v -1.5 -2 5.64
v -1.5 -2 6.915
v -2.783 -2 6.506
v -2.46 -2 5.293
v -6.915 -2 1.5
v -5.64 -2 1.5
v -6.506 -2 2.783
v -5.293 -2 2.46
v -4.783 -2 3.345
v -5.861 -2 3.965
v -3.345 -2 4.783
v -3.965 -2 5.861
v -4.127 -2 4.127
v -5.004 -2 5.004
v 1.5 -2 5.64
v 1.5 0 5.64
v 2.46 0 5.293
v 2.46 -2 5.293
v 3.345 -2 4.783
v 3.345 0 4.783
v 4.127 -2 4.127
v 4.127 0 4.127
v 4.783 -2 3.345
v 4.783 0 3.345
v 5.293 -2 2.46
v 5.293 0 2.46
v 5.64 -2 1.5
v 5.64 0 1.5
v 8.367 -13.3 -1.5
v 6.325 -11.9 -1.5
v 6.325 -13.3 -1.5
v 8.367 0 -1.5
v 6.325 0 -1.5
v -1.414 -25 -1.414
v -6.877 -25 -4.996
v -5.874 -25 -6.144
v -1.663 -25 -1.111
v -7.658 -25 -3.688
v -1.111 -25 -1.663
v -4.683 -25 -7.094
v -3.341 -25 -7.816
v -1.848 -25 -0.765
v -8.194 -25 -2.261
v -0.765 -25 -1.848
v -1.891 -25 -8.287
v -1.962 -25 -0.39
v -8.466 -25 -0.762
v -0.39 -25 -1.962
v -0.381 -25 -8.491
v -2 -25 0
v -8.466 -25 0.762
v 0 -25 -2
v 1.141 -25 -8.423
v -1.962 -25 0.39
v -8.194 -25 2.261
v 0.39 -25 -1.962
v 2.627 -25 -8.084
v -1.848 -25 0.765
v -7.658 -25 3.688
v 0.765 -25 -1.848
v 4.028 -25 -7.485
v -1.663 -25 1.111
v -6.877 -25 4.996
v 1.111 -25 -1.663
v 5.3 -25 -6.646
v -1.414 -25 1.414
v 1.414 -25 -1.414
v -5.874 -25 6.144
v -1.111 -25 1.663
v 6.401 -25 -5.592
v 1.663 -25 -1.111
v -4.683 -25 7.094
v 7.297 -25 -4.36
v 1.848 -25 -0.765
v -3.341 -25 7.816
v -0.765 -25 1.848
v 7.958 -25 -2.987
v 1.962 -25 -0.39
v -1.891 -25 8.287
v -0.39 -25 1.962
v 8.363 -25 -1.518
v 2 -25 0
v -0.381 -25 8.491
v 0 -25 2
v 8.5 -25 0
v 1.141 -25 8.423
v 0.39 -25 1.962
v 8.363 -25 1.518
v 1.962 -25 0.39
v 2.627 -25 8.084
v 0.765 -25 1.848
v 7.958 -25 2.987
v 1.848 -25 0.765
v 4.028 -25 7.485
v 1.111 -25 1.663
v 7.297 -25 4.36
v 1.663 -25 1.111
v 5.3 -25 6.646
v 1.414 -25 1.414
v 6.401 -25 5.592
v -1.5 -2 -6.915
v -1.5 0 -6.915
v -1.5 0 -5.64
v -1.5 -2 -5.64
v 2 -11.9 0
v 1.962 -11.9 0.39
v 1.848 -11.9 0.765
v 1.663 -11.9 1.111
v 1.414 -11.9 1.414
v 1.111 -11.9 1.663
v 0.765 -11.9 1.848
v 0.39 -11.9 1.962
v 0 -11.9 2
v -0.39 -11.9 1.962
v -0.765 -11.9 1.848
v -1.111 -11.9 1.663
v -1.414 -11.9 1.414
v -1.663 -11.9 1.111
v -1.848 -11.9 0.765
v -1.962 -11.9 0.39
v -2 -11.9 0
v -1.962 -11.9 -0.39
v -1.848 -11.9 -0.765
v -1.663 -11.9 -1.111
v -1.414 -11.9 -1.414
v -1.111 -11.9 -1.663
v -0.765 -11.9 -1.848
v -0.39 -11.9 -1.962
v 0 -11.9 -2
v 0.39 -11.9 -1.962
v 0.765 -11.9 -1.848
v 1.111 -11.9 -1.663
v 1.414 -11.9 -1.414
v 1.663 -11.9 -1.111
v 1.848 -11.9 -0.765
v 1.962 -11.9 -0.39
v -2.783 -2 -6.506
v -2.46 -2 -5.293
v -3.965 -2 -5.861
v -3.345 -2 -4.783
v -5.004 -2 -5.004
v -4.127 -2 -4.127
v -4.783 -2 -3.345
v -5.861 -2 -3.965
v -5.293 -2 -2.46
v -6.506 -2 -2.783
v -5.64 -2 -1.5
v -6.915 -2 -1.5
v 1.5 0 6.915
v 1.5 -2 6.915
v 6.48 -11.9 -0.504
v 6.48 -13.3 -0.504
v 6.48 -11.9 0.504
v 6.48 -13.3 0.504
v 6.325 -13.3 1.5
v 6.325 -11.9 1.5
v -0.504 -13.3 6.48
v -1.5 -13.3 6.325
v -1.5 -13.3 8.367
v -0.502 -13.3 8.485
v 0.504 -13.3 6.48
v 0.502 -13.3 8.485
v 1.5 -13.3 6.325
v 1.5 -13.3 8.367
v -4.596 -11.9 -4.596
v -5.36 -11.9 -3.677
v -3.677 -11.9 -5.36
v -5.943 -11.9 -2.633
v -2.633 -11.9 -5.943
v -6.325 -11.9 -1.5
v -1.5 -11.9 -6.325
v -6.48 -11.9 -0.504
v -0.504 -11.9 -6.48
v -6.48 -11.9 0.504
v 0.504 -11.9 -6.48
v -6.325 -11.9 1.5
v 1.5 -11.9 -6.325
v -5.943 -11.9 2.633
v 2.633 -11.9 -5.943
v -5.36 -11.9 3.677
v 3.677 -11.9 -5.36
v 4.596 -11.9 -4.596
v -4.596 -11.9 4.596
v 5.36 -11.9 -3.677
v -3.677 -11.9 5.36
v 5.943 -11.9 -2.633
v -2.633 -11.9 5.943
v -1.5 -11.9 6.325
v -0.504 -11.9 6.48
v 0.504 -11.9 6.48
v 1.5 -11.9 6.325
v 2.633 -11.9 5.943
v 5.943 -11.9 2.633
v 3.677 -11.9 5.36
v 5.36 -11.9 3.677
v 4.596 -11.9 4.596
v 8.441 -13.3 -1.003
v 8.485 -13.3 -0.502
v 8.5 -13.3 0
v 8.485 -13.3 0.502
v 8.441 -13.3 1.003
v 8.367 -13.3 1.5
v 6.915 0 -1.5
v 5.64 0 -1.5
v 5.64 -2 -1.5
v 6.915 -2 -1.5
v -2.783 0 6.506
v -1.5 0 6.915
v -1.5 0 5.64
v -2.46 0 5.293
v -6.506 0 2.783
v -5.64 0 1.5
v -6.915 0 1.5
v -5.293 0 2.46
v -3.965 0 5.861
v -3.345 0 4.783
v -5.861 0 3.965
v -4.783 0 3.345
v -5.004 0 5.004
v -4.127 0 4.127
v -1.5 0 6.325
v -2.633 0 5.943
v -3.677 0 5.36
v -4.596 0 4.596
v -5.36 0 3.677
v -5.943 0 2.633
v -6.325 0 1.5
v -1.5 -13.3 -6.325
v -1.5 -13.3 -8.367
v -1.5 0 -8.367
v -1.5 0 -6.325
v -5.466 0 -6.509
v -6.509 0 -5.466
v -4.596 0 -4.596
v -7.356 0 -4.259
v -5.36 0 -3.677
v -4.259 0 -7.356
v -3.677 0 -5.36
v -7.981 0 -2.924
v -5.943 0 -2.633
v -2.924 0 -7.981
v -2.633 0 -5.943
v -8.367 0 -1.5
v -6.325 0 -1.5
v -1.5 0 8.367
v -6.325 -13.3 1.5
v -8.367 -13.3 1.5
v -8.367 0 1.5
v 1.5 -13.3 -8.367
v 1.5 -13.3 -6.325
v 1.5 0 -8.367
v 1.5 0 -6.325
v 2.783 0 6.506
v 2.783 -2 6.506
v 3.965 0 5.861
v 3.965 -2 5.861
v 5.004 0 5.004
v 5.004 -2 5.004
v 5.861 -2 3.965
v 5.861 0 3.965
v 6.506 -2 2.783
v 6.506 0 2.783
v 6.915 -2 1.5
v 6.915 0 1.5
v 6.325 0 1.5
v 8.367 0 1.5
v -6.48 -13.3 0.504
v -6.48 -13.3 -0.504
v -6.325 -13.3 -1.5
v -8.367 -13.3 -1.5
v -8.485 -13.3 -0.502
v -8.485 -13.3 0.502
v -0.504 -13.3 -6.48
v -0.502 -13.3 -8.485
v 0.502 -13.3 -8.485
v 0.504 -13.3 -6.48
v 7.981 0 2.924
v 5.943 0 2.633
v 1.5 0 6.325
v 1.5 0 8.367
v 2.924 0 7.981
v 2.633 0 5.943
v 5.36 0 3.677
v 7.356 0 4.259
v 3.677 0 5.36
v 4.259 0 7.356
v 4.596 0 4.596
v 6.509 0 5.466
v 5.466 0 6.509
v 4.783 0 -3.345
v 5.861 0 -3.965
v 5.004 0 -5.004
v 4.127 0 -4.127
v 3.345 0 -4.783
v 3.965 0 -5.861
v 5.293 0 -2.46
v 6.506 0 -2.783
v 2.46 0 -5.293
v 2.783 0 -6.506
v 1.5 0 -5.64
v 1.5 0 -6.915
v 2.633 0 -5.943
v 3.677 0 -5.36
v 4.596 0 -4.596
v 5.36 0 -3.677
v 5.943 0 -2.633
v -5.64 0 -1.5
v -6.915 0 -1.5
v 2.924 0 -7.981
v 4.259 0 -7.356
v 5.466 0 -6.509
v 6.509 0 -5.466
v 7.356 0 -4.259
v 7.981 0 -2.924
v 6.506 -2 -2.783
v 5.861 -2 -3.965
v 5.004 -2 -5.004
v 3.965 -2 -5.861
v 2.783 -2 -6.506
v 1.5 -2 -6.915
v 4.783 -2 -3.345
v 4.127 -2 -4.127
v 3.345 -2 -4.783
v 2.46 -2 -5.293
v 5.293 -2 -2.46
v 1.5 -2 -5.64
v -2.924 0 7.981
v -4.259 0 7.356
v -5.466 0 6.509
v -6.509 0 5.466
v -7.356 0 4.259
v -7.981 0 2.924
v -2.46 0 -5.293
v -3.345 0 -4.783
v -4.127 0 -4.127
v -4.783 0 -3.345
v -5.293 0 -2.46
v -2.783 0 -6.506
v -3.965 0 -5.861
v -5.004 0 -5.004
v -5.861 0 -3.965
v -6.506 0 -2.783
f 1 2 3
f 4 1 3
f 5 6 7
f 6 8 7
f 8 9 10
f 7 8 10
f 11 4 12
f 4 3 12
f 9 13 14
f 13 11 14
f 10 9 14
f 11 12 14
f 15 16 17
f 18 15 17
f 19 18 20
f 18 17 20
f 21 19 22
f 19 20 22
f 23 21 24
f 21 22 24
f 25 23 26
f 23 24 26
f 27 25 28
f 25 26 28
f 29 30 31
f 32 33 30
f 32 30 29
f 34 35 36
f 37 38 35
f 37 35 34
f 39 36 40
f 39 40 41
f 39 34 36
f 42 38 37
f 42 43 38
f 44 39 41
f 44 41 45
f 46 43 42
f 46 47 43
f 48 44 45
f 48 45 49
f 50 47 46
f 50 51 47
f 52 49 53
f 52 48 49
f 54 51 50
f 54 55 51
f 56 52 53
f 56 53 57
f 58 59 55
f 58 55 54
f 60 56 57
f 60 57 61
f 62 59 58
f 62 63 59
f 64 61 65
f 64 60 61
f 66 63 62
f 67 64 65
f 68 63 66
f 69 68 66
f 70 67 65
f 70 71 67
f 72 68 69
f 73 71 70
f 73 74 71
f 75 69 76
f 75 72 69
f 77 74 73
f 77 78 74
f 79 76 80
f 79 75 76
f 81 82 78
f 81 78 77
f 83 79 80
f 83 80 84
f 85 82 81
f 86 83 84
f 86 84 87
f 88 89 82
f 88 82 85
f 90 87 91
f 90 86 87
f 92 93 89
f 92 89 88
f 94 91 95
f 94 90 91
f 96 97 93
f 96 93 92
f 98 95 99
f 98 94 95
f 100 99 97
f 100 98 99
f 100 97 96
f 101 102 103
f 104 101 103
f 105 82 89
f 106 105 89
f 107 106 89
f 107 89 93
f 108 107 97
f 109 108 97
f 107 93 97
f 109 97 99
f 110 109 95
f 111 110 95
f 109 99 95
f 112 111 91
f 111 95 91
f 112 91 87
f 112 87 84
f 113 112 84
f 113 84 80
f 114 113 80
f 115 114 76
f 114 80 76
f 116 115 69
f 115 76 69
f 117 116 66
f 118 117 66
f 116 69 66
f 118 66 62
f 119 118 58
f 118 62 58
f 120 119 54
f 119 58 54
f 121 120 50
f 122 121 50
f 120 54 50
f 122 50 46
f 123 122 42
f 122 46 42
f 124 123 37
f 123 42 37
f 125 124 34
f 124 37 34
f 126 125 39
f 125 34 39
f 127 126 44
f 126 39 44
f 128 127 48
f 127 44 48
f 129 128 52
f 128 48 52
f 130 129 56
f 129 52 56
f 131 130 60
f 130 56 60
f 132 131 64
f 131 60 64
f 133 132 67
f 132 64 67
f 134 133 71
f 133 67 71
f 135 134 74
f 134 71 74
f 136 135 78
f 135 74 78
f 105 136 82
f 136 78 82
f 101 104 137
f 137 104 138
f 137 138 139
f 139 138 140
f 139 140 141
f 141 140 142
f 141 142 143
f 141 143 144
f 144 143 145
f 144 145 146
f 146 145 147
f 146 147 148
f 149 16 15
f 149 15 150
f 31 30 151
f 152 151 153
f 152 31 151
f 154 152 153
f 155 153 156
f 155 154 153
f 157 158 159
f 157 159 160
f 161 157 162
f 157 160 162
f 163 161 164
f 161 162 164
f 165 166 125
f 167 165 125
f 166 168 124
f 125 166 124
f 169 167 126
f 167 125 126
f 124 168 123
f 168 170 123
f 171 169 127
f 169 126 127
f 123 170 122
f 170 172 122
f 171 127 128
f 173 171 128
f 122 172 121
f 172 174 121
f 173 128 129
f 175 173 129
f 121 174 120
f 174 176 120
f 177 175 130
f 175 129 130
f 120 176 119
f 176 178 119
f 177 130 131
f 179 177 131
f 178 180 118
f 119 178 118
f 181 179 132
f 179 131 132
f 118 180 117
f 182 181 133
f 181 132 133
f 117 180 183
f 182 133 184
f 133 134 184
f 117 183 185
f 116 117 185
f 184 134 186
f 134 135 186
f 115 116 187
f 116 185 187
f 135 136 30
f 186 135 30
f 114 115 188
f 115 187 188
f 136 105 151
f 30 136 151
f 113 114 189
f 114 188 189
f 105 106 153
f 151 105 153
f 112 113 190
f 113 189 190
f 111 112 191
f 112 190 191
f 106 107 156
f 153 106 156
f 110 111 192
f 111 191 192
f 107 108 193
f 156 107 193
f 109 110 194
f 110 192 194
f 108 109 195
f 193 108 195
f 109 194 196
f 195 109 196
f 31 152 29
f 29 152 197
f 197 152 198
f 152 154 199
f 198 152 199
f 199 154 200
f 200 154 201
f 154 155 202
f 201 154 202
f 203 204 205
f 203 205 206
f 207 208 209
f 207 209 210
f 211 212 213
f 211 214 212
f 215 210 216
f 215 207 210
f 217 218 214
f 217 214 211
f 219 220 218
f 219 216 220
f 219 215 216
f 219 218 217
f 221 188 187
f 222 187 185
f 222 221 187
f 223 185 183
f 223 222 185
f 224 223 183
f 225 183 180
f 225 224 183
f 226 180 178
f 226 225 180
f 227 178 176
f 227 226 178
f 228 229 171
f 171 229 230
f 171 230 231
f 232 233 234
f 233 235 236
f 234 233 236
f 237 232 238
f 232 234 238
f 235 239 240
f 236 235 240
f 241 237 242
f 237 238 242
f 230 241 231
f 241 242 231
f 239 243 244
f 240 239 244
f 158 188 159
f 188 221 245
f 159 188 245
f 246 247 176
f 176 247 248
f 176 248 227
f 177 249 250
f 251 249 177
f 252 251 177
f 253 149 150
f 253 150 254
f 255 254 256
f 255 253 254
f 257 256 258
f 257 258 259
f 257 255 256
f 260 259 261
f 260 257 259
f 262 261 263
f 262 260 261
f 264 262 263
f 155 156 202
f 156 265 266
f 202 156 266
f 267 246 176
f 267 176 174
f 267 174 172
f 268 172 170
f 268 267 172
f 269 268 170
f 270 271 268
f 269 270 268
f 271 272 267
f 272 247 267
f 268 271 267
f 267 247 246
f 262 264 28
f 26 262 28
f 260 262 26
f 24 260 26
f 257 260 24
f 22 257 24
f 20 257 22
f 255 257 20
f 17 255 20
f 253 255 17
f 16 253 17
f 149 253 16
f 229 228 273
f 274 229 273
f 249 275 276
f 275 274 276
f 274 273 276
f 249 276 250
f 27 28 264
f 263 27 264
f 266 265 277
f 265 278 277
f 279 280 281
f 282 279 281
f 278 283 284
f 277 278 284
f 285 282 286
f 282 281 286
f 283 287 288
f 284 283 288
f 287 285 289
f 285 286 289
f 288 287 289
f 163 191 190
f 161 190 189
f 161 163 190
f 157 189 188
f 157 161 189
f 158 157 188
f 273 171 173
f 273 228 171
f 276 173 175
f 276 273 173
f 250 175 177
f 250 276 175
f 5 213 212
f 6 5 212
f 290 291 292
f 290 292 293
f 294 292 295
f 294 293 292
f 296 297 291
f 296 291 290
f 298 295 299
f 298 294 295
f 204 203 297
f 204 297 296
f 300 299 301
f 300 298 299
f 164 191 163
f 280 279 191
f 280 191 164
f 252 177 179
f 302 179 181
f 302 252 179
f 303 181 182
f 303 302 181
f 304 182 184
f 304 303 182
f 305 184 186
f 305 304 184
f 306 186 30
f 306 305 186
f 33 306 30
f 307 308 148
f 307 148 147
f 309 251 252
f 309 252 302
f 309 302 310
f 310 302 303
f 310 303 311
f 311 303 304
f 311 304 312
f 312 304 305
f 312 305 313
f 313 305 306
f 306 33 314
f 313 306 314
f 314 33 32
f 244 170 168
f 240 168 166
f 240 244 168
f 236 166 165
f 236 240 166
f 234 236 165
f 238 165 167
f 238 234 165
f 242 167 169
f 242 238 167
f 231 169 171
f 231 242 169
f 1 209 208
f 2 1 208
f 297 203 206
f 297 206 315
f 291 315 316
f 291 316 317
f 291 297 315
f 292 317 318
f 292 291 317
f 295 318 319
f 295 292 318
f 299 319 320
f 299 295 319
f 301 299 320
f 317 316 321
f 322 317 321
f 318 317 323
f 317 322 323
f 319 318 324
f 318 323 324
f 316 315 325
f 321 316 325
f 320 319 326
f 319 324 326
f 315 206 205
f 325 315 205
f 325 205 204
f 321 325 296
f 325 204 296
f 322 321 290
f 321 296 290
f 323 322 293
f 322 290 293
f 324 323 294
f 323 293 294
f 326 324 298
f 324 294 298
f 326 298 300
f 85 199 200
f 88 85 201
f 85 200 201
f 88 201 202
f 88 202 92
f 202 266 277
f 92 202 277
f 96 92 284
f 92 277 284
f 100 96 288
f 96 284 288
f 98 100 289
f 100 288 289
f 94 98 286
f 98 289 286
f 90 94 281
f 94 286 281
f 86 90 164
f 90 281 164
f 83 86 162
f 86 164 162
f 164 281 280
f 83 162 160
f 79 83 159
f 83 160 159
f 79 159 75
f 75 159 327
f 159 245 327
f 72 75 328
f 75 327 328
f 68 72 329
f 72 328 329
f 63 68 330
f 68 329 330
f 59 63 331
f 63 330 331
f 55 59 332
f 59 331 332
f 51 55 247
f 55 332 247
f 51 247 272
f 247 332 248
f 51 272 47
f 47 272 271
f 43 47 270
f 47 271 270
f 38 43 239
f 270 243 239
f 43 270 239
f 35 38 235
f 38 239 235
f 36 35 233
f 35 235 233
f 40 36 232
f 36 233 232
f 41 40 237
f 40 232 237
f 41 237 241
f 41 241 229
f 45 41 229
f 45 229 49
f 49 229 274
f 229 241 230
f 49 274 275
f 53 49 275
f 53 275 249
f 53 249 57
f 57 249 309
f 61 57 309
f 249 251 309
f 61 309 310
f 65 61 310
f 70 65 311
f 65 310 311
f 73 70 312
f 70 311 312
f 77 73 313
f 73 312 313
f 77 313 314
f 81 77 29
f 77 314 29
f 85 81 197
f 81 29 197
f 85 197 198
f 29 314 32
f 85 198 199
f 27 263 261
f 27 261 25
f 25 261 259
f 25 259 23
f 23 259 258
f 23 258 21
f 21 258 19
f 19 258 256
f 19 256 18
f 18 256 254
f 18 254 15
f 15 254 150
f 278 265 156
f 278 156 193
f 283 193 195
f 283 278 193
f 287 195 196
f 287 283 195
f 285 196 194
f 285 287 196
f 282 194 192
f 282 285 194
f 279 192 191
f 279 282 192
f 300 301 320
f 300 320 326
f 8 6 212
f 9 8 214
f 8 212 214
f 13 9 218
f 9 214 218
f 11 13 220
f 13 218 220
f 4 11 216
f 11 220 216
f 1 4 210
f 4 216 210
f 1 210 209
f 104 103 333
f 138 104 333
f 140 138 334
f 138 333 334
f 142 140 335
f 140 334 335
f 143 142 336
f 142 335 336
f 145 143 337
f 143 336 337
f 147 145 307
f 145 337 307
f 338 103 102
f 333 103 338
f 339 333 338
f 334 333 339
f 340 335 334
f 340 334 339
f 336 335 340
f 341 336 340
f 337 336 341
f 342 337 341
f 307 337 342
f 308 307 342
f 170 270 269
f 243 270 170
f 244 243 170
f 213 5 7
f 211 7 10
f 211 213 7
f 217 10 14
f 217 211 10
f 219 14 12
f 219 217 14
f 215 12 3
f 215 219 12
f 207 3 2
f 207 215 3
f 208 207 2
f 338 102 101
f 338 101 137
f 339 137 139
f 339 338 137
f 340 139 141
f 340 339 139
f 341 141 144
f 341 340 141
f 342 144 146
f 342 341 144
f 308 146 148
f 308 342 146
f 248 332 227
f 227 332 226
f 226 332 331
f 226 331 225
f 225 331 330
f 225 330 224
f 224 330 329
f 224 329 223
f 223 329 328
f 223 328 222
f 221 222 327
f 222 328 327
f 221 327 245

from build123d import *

# Parameters (mm, degrees)
F0_R     = 8.5
F0_R_2   = 6.5
F1_DEPTH = 25
F2_R     = 7.076041
F2_R_2   = 5.836278
F3_DEPTH = 2
F4_W     = 10.774727
F4_H     = 3
F4_W_2   = 3
F4_H_2   = 10.461046
F5_DEPTH = 13.3
F6_R     = 6.5
F6_R_2   = 2
F7_DEPTH = 13.1


with BuildPart() as f1:
    # F0 (on Front) → F1 (new body)
    with BuildSketch(Plane.XZ):
        Circle(F0_R)
        Circle(F0_R_2, mode=Mode.SUBTRACT)
    extrude(amount=F1_DEPTH)


with BuildPart() as f3:
    # F2 (on face) → F3 (new body)
    with BuildSketch(Plane(origin=(0, 0, 0), x_dir=(-1, 0, 0), z_dir=(0, 1, 0))):
        Circle(F2_R)
        Circle(F2_R_2, mode=Mode.SUBTRACT)
    extrude(amount=-F3_DEPTH)


with BuildPart() as f5_tool:
    # F4 (on Front) → F5 (new body)
    with BuildSketch(Plane.XZ):
        with Locations((-6.887363, 0)):
            Rectangle(F4_W, F4_H)
        with Locations((0, 6.730523)):
            Rectangle(F4_W_2, F4_H_2)
        with Locations((6.887363, 0)):
            Rectangle(F4_W, F4_H)
        with Locations((0, -6.730523)):
            Rectangle(F4_W_2, F4_H_2)
    extrude(amount=F5_DEPTH)


with BuildPart() as f1_1:
    add(f1.part)

    # F5: cut by f5_tool
    add(f5_tool.part, mode=Mode.SUBTRACT)

    # F6 (on face) → F7 (join)
    with BuildSketch(Plane.XZ.offset(25)):
        Circle(F6_R)
        Circle(F6_R_2, mode=Mode.SUBTRACT)
    extrude(amount=-F7_DEPTH)


with BuildPart() as f3_1:
    add(f3.part)

    # F5: cut by f5_tool
    add(f5_tool.part, mode=Mode.SUBTRACT)


solid = Compound([f1_1.part, f3_1.part])
